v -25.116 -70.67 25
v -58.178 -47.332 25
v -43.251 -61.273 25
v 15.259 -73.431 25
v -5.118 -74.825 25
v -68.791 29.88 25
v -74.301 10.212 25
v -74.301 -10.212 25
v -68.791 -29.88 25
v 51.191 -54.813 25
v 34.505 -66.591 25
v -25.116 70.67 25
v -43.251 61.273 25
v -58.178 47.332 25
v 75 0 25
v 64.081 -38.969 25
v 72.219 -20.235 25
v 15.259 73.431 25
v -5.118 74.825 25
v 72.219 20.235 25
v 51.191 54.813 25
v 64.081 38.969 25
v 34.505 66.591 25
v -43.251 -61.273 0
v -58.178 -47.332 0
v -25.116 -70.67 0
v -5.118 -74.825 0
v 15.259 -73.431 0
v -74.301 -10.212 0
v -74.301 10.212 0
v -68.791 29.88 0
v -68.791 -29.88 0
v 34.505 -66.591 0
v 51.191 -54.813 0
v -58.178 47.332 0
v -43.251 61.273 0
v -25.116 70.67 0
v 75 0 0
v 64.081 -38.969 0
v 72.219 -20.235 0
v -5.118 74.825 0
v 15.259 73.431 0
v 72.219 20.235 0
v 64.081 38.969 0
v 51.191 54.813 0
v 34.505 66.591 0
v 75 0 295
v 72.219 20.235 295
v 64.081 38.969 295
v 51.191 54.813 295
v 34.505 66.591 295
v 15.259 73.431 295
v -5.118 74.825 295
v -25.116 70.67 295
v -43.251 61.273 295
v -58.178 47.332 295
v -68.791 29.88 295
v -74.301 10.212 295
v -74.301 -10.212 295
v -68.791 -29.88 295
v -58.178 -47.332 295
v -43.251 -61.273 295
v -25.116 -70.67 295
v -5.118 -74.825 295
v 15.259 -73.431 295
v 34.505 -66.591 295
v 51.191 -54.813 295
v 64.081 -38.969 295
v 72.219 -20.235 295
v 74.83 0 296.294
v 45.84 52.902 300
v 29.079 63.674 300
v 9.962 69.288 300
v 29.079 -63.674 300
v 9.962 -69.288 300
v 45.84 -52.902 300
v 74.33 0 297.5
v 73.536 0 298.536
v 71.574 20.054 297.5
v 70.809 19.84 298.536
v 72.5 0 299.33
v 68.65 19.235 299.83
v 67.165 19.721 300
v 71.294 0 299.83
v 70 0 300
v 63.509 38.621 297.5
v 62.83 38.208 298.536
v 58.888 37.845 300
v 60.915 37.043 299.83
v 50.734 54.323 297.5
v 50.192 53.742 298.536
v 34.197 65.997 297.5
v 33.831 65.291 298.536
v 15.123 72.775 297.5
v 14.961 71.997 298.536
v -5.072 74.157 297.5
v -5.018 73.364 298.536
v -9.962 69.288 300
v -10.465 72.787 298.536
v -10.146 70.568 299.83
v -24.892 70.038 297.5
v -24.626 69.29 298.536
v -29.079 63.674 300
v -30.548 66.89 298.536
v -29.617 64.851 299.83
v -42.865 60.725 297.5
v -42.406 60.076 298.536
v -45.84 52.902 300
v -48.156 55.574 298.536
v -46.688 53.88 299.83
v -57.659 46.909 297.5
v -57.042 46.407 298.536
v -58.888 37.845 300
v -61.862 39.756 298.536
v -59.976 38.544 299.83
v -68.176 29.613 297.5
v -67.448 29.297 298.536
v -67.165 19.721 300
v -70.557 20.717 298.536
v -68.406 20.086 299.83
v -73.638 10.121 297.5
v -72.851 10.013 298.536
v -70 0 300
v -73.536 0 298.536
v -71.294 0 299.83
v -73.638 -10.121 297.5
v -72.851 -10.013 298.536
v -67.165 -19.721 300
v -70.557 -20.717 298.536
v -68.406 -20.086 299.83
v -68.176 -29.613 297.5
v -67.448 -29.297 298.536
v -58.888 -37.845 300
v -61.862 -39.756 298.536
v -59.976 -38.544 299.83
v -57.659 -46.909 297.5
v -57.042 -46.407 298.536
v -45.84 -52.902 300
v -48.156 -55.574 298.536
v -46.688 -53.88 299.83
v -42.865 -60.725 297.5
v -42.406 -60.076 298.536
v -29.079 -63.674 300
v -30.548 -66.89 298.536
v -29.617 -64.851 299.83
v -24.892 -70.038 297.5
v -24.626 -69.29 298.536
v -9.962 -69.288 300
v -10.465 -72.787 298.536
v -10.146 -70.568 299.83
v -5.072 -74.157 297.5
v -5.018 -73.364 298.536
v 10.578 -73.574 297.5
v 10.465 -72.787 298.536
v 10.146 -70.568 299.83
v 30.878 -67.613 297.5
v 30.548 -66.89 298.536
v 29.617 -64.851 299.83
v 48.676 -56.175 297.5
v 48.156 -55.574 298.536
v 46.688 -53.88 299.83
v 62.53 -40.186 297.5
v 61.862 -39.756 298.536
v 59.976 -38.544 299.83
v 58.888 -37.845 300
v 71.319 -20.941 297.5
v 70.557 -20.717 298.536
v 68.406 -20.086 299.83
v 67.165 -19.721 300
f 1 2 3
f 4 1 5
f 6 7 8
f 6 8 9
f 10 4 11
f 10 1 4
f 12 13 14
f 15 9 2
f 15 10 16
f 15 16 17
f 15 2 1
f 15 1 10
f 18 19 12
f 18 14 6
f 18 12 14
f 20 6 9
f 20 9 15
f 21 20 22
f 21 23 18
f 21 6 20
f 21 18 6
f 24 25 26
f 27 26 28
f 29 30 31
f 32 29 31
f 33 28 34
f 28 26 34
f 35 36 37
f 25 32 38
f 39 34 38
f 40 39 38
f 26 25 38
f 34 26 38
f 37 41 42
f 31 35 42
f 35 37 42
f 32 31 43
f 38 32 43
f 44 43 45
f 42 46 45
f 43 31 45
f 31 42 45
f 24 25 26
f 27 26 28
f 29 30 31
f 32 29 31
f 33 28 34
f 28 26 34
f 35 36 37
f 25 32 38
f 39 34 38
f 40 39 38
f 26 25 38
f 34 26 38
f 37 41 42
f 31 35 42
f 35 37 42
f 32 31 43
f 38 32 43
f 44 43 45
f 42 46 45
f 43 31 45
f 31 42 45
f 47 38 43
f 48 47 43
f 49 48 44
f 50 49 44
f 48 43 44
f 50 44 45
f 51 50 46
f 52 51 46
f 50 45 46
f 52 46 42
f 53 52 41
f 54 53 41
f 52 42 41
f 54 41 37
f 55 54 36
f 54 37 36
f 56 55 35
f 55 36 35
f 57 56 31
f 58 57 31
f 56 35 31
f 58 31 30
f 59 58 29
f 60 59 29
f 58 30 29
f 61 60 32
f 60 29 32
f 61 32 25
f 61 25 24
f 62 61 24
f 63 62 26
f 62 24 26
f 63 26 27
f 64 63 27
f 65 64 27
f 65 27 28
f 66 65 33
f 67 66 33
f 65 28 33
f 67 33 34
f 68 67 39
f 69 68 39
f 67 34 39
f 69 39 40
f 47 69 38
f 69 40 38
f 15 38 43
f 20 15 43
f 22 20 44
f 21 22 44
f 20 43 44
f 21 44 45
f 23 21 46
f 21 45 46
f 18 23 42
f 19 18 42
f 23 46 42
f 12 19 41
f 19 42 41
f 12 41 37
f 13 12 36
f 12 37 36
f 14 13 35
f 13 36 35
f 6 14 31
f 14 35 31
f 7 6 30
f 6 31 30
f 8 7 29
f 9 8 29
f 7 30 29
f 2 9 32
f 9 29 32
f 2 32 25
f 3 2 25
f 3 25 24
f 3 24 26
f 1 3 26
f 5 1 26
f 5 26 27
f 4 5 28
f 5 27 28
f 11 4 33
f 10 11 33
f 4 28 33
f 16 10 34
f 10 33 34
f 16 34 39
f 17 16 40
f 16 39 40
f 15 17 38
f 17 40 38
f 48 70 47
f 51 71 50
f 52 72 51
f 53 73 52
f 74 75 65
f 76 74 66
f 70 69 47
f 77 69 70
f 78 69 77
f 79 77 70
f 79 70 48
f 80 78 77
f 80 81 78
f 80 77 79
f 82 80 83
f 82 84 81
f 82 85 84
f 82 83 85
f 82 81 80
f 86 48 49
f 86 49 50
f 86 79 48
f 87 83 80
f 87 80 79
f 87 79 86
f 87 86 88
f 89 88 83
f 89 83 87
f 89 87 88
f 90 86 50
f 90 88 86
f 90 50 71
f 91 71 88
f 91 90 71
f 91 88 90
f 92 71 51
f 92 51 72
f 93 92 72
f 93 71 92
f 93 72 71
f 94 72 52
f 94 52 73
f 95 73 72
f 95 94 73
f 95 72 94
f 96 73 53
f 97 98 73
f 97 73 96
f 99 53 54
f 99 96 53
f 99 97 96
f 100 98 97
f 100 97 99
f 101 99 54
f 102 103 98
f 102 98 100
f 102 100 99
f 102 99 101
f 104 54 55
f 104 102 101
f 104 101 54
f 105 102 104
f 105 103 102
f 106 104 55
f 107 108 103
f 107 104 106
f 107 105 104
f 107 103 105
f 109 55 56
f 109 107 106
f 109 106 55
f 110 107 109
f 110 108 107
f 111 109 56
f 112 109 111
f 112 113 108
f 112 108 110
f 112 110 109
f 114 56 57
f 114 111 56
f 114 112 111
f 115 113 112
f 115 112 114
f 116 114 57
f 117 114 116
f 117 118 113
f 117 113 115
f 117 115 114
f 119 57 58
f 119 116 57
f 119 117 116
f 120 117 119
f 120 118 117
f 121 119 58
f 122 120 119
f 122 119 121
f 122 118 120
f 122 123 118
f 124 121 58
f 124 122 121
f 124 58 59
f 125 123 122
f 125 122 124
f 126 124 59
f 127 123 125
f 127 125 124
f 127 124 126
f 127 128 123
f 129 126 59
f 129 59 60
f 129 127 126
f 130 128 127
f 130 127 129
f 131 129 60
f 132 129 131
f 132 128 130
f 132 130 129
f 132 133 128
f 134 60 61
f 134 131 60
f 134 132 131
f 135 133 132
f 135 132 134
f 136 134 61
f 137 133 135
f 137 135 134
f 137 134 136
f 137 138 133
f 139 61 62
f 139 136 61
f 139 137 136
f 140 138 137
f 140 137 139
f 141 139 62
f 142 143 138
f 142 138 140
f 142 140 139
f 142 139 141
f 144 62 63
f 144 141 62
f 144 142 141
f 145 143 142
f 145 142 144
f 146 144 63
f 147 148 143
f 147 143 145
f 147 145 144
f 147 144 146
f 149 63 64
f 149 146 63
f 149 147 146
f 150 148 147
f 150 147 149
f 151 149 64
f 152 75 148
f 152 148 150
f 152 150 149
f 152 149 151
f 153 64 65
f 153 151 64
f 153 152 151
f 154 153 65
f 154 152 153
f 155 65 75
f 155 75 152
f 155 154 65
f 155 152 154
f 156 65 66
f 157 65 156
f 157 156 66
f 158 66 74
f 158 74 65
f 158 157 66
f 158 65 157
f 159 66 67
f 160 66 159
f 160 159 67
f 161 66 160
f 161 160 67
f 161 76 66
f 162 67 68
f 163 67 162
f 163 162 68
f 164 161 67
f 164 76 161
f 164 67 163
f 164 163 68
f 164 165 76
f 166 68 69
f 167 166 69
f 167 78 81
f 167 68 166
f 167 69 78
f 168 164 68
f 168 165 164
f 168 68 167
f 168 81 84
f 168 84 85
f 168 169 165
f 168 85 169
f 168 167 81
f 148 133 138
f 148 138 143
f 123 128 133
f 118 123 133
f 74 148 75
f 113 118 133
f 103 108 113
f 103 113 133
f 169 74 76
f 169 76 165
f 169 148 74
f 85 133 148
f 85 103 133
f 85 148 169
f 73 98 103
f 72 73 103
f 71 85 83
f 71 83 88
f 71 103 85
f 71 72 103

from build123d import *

# Parameters (mm, degrees)
F0_R     = 75
F1_DEPTH = 300
F2_R     = 5
F3_DEPTH = 25


with BuildPart() as f1:
    # F0 (on Top) → F1 (new body)
    with BuildSketch(Plane.XY):
        Circle(F0_R)
    extrude(amount=F1_DEPTH)

    # F2
    f2_edges = [f1.edges().sort_by_distance(p)[0] for p in [
        (-75, 0, 300),
    ]]
    fillet(f2_edges, radius=F2_R)


with BuildPart() as f3:
    # F0 (on Top) → F3 (new body)
    with BuildSketch(Plane.XY):
        Circle(F0_R)
    extrude(amount=F3_DEPTH)


solid = Compound([f1.part, f3.part])
